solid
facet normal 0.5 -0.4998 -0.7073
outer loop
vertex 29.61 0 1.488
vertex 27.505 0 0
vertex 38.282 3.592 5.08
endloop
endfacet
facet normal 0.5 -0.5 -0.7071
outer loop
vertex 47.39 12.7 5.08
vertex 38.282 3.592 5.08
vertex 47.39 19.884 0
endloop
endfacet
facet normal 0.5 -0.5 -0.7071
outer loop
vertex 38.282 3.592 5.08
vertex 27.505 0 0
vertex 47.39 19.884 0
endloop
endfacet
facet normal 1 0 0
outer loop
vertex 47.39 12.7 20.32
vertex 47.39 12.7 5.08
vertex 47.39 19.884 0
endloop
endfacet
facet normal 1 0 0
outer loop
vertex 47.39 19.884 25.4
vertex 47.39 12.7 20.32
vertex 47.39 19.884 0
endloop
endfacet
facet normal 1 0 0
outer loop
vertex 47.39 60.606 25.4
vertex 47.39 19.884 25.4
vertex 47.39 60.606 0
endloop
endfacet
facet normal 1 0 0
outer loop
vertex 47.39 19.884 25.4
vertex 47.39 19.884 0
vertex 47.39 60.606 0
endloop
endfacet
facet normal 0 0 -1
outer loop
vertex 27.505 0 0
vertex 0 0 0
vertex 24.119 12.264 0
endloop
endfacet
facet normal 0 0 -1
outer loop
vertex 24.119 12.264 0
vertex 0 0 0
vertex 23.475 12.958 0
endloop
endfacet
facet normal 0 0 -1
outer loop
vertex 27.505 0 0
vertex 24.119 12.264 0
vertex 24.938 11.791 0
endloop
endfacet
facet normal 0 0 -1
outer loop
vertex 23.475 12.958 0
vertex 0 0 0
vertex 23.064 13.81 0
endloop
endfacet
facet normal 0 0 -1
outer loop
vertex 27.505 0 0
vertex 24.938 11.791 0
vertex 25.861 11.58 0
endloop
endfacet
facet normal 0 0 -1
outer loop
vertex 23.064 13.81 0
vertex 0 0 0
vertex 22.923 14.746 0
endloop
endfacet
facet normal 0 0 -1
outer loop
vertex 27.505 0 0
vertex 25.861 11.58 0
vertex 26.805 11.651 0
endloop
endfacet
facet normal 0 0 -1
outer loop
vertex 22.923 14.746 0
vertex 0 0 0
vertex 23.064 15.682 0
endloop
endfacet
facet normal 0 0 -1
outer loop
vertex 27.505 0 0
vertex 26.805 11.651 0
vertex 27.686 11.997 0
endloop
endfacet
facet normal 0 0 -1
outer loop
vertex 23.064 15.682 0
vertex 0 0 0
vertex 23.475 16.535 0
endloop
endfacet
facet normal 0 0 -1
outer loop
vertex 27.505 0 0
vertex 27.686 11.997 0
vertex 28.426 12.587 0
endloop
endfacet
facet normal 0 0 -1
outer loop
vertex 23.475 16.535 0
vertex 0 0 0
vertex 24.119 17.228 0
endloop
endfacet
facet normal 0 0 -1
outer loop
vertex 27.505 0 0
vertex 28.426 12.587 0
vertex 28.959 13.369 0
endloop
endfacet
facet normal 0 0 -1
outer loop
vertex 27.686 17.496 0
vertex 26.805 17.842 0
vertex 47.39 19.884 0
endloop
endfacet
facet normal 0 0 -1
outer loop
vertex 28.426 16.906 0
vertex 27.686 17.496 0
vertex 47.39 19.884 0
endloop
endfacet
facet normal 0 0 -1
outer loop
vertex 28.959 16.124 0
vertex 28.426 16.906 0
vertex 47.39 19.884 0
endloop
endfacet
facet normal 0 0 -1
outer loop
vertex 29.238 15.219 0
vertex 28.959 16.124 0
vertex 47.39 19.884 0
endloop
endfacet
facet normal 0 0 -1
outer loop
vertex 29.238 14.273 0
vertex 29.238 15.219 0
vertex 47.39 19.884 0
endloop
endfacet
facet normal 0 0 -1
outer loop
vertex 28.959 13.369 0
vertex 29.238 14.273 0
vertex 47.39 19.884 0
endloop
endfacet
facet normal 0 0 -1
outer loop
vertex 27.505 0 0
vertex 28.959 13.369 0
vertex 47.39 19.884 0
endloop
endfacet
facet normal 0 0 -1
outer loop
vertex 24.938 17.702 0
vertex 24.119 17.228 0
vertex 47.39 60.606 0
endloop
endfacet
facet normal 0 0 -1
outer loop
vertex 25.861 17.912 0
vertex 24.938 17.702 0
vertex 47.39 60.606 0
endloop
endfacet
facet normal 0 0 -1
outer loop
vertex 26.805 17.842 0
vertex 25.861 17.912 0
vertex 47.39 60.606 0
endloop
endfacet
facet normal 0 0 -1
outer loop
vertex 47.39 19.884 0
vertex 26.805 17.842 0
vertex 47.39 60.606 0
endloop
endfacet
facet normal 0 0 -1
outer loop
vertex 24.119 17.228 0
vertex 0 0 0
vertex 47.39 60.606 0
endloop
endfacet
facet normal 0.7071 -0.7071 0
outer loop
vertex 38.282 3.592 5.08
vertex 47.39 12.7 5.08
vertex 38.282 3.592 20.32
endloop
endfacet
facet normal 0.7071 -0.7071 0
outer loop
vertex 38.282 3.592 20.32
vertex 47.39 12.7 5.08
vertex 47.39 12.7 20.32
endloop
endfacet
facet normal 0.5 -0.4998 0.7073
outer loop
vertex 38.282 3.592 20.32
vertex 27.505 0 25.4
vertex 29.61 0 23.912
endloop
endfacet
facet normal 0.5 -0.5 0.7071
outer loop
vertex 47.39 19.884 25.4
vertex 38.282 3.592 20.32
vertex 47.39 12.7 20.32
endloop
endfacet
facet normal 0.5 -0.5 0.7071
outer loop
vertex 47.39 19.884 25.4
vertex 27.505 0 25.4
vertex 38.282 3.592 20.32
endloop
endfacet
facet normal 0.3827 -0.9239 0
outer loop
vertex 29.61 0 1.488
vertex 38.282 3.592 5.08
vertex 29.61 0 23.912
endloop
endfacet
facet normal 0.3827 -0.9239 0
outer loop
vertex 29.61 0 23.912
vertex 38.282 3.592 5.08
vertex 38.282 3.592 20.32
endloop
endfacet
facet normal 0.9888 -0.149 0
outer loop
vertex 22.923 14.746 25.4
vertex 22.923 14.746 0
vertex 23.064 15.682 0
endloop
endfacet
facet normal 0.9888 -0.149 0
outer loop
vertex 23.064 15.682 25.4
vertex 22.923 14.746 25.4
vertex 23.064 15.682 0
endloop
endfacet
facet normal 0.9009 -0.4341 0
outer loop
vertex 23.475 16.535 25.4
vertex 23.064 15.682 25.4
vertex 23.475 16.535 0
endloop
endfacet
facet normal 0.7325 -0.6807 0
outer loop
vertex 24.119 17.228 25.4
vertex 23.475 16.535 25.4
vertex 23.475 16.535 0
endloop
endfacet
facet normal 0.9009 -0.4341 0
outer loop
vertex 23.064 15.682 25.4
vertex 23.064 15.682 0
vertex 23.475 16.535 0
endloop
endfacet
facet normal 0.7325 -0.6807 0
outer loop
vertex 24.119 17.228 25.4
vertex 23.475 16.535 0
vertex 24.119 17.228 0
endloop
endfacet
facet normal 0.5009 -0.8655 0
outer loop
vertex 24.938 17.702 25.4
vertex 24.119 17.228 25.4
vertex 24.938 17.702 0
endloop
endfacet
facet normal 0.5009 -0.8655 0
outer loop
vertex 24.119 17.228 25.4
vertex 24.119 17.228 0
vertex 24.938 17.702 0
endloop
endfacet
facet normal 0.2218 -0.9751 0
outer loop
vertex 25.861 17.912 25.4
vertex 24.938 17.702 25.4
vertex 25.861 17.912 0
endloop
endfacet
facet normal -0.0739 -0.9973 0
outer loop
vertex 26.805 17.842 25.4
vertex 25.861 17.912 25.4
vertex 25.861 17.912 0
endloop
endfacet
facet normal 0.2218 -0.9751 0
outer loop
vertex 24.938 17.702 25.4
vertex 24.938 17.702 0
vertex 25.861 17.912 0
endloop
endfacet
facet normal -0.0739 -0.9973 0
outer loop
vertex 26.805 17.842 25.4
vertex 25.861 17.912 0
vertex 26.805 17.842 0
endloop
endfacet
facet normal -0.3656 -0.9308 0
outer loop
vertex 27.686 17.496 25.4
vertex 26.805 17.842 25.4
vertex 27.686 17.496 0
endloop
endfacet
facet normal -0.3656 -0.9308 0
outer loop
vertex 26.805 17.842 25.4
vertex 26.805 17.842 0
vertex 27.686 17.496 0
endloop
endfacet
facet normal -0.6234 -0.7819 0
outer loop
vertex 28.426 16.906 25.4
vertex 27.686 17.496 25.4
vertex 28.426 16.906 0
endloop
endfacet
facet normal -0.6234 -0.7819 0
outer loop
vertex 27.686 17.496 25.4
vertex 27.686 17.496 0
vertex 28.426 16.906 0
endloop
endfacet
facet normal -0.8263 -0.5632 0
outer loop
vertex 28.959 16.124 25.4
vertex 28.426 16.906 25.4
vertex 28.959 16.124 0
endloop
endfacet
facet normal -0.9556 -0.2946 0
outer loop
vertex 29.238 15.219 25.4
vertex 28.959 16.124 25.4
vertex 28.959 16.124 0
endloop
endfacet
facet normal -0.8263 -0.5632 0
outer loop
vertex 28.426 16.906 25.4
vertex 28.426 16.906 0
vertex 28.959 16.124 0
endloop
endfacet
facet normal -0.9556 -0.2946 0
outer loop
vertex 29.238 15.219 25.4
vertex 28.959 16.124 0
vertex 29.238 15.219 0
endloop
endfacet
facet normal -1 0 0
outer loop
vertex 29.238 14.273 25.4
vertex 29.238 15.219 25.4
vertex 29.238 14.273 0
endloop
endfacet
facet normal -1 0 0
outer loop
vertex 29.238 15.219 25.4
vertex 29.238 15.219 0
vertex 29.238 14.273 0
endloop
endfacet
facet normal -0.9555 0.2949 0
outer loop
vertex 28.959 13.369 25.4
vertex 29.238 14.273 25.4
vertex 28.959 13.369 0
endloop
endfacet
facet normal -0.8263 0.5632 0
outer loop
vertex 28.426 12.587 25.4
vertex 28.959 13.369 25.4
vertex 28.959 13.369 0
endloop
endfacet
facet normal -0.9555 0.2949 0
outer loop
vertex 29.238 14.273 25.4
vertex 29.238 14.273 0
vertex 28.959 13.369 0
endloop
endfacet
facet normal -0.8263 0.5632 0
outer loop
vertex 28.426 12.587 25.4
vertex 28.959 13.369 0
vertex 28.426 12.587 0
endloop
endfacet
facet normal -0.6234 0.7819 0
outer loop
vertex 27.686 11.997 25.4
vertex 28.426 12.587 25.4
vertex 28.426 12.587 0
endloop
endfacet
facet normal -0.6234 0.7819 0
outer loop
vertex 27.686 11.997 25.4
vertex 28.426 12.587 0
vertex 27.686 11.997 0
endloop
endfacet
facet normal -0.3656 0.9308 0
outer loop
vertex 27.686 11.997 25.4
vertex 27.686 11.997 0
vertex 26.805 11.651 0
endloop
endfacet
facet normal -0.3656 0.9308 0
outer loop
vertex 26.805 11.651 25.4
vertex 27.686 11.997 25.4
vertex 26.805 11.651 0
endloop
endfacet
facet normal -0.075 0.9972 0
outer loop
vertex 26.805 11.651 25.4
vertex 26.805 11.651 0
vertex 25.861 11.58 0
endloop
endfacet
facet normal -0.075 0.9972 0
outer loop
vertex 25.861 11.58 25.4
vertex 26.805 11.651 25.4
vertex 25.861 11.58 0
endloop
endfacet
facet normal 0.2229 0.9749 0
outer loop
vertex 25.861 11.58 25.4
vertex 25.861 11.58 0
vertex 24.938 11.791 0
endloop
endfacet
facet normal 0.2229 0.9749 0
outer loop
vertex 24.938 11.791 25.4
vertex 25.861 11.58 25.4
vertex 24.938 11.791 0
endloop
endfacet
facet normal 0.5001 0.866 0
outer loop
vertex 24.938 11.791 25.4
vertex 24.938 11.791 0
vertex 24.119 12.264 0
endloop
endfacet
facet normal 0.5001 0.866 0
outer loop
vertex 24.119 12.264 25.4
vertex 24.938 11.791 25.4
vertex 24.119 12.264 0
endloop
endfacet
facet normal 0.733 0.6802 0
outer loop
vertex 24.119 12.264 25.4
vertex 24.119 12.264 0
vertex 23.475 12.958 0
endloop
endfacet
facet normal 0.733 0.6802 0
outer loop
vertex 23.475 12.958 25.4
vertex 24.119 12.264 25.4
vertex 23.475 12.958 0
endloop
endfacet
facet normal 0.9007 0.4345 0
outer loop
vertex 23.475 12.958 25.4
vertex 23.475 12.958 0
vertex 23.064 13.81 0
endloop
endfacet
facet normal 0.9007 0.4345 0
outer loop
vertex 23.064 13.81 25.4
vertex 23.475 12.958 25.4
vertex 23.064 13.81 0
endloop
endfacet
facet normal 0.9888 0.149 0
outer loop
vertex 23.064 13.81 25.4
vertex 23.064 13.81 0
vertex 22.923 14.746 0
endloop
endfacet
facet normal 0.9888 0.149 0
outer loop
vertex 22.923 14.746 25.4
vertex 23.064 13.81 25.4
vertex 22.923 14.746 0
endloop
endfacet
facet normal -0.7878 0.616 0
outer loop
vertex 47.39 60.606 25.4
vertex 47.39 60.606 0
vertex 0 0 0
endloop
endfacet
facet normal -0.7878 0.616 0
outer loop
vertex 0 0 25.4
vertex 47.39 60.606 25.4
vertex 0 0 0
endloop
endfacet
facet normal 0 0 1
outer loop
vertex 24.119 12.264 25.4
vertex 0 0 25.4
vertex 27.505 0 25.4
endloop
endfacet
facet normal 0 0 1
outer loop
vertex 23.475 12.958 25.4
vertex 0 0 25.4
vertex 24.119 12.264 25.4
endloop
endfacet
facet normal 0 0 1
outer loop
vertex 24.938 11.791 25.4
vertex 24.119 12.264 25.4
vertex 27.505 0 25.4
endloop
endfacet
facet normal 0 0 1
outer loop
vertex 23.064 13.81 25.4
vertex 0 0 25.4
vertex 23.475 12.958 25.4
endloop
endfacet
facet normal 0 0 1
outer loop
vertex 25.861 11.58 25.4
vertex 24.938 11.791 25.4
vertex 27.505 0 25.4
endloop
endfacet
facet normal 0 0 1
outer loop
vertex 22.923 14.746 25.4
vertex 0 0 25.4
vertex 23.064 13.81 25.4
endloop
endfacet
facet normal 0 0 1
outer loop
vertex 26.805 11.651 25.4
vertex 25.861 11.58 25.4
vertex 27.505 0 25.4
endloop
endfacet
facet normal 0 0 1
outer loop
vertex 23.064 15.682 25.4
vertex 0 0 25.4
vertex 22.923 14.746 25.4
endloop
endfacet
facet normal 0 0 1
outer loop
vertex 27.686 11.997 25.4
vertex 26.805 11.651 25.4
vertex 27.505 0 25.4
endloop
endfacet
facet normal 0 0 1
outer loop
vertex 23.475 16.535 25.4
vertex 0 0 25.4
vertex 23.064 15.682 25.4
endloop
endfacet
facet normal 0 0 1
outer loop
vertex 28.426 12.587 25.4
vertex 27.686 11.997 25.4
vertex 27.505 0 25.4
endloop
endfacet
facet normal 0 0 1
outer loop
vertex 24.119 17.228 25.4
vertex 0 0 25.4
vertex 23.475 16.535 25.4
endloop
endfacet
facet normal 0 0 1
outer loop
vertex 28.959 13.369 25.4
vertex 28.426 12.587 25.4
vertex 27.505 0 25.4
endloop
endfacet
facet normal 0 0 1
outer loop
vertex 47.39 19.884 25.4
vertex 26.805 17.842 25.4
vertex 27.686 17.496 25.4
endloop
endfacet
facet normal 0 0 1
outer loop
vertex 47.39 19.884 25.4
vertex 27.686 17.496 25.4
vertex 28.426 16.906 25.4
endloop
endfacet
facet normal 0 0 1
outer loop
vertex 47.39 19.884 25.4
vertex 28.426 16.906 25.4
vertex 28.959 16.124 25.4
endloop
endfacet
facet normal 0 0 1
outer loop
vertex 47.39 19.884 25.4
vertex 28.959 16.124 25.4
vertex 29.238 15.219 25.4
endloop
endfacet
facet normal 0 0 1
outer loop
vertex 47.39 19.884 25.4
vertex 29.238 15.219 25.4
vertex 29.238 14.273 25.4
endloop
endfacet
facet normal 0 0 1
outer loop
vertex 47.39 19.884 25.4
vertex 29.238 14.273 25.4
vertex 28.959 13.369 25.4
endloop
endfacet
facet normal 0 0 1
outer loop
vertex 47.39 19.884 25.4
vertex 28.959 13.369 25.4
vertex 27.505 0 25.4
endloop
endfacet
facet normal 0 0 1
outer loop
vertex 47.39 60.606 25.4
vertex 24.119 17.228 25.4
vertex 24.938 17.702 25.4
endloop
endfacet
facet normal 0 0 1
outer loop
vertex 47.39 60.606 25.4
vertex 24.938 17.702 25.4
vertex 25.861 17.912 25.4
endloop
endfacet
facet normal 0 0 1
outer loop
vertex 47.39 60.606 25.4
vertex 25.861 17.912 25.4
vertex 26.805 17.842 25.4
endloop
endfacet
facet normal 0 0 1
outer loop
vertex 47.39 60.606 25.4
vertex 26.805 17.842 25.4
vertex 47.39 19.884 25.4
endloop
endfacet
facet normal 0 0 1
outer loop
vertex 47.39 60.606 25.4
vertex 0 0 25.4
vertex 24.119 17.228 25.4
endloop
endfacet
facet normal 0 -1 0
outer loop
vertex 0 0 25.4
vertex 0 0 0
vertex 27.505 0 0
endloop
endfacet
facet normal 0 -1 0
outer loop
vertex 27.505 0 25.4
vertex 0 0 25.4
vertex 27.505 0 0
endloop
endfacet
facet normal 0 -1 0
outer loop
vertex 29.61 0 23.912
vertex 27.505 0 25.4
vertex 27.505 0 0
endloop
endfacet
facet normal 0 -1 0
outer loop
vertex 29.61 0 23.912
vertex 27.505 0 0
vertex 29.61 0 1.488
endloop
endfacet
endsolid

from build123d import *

# Parameters (mm, degrees)
F1_DEPTH = 25.4
F2_SIZE  = 12.7
F3_SIZE  = 5.08
F4_SIZE  = 5.08
F5_SIZE  = 5.08
F7_D     = 6.35


with BuildPart() as f1:
    # F0 (on Top) → F1 (new body)
    with BuildSketch(Plane.XY):
        Polygon((47.389537096, 60.6057569385), (0, 0), (47.389537096, 0), align=None)
    extrude(amount=F1_DEPTH)

    # F2
    f2_edges = [f1.edges().sort_by_distance(p)[0] for p in [
        (47.389537, 0, 12.7),
    ]]
    chamfer(f2_edges, length=F2_SIZE)

    # F3
    f3_edges = [f1.edges().sort_by_distance(p)[0] for p in [
        (41.039537, 6.35, 25.4),
    ]]
    chamfer(f3_edges, length=F3_SIZE)

    # F4
    f4_edges = [f1.edges().sort_by_distance(p)[0] for p in [
        (41.039537, 6.35, 0),
    ]]
    chamfer(f4_edges, length=F4_SIZE)

    # F5
    f5_edges = [f1.edges().sort_by_distance(p)[0] for p in [
        (34.689537, 0, 12.7),
    ]]
    chamfer(f5_edges, length=F5_SIZE)

    # F7 (through all)
    with Locations(Plane.XY.offset(25.4)):
        with Locations((26.0983891785, 14.7461835295)):
            Hole(F7_D / 2)


solid = f1.part
